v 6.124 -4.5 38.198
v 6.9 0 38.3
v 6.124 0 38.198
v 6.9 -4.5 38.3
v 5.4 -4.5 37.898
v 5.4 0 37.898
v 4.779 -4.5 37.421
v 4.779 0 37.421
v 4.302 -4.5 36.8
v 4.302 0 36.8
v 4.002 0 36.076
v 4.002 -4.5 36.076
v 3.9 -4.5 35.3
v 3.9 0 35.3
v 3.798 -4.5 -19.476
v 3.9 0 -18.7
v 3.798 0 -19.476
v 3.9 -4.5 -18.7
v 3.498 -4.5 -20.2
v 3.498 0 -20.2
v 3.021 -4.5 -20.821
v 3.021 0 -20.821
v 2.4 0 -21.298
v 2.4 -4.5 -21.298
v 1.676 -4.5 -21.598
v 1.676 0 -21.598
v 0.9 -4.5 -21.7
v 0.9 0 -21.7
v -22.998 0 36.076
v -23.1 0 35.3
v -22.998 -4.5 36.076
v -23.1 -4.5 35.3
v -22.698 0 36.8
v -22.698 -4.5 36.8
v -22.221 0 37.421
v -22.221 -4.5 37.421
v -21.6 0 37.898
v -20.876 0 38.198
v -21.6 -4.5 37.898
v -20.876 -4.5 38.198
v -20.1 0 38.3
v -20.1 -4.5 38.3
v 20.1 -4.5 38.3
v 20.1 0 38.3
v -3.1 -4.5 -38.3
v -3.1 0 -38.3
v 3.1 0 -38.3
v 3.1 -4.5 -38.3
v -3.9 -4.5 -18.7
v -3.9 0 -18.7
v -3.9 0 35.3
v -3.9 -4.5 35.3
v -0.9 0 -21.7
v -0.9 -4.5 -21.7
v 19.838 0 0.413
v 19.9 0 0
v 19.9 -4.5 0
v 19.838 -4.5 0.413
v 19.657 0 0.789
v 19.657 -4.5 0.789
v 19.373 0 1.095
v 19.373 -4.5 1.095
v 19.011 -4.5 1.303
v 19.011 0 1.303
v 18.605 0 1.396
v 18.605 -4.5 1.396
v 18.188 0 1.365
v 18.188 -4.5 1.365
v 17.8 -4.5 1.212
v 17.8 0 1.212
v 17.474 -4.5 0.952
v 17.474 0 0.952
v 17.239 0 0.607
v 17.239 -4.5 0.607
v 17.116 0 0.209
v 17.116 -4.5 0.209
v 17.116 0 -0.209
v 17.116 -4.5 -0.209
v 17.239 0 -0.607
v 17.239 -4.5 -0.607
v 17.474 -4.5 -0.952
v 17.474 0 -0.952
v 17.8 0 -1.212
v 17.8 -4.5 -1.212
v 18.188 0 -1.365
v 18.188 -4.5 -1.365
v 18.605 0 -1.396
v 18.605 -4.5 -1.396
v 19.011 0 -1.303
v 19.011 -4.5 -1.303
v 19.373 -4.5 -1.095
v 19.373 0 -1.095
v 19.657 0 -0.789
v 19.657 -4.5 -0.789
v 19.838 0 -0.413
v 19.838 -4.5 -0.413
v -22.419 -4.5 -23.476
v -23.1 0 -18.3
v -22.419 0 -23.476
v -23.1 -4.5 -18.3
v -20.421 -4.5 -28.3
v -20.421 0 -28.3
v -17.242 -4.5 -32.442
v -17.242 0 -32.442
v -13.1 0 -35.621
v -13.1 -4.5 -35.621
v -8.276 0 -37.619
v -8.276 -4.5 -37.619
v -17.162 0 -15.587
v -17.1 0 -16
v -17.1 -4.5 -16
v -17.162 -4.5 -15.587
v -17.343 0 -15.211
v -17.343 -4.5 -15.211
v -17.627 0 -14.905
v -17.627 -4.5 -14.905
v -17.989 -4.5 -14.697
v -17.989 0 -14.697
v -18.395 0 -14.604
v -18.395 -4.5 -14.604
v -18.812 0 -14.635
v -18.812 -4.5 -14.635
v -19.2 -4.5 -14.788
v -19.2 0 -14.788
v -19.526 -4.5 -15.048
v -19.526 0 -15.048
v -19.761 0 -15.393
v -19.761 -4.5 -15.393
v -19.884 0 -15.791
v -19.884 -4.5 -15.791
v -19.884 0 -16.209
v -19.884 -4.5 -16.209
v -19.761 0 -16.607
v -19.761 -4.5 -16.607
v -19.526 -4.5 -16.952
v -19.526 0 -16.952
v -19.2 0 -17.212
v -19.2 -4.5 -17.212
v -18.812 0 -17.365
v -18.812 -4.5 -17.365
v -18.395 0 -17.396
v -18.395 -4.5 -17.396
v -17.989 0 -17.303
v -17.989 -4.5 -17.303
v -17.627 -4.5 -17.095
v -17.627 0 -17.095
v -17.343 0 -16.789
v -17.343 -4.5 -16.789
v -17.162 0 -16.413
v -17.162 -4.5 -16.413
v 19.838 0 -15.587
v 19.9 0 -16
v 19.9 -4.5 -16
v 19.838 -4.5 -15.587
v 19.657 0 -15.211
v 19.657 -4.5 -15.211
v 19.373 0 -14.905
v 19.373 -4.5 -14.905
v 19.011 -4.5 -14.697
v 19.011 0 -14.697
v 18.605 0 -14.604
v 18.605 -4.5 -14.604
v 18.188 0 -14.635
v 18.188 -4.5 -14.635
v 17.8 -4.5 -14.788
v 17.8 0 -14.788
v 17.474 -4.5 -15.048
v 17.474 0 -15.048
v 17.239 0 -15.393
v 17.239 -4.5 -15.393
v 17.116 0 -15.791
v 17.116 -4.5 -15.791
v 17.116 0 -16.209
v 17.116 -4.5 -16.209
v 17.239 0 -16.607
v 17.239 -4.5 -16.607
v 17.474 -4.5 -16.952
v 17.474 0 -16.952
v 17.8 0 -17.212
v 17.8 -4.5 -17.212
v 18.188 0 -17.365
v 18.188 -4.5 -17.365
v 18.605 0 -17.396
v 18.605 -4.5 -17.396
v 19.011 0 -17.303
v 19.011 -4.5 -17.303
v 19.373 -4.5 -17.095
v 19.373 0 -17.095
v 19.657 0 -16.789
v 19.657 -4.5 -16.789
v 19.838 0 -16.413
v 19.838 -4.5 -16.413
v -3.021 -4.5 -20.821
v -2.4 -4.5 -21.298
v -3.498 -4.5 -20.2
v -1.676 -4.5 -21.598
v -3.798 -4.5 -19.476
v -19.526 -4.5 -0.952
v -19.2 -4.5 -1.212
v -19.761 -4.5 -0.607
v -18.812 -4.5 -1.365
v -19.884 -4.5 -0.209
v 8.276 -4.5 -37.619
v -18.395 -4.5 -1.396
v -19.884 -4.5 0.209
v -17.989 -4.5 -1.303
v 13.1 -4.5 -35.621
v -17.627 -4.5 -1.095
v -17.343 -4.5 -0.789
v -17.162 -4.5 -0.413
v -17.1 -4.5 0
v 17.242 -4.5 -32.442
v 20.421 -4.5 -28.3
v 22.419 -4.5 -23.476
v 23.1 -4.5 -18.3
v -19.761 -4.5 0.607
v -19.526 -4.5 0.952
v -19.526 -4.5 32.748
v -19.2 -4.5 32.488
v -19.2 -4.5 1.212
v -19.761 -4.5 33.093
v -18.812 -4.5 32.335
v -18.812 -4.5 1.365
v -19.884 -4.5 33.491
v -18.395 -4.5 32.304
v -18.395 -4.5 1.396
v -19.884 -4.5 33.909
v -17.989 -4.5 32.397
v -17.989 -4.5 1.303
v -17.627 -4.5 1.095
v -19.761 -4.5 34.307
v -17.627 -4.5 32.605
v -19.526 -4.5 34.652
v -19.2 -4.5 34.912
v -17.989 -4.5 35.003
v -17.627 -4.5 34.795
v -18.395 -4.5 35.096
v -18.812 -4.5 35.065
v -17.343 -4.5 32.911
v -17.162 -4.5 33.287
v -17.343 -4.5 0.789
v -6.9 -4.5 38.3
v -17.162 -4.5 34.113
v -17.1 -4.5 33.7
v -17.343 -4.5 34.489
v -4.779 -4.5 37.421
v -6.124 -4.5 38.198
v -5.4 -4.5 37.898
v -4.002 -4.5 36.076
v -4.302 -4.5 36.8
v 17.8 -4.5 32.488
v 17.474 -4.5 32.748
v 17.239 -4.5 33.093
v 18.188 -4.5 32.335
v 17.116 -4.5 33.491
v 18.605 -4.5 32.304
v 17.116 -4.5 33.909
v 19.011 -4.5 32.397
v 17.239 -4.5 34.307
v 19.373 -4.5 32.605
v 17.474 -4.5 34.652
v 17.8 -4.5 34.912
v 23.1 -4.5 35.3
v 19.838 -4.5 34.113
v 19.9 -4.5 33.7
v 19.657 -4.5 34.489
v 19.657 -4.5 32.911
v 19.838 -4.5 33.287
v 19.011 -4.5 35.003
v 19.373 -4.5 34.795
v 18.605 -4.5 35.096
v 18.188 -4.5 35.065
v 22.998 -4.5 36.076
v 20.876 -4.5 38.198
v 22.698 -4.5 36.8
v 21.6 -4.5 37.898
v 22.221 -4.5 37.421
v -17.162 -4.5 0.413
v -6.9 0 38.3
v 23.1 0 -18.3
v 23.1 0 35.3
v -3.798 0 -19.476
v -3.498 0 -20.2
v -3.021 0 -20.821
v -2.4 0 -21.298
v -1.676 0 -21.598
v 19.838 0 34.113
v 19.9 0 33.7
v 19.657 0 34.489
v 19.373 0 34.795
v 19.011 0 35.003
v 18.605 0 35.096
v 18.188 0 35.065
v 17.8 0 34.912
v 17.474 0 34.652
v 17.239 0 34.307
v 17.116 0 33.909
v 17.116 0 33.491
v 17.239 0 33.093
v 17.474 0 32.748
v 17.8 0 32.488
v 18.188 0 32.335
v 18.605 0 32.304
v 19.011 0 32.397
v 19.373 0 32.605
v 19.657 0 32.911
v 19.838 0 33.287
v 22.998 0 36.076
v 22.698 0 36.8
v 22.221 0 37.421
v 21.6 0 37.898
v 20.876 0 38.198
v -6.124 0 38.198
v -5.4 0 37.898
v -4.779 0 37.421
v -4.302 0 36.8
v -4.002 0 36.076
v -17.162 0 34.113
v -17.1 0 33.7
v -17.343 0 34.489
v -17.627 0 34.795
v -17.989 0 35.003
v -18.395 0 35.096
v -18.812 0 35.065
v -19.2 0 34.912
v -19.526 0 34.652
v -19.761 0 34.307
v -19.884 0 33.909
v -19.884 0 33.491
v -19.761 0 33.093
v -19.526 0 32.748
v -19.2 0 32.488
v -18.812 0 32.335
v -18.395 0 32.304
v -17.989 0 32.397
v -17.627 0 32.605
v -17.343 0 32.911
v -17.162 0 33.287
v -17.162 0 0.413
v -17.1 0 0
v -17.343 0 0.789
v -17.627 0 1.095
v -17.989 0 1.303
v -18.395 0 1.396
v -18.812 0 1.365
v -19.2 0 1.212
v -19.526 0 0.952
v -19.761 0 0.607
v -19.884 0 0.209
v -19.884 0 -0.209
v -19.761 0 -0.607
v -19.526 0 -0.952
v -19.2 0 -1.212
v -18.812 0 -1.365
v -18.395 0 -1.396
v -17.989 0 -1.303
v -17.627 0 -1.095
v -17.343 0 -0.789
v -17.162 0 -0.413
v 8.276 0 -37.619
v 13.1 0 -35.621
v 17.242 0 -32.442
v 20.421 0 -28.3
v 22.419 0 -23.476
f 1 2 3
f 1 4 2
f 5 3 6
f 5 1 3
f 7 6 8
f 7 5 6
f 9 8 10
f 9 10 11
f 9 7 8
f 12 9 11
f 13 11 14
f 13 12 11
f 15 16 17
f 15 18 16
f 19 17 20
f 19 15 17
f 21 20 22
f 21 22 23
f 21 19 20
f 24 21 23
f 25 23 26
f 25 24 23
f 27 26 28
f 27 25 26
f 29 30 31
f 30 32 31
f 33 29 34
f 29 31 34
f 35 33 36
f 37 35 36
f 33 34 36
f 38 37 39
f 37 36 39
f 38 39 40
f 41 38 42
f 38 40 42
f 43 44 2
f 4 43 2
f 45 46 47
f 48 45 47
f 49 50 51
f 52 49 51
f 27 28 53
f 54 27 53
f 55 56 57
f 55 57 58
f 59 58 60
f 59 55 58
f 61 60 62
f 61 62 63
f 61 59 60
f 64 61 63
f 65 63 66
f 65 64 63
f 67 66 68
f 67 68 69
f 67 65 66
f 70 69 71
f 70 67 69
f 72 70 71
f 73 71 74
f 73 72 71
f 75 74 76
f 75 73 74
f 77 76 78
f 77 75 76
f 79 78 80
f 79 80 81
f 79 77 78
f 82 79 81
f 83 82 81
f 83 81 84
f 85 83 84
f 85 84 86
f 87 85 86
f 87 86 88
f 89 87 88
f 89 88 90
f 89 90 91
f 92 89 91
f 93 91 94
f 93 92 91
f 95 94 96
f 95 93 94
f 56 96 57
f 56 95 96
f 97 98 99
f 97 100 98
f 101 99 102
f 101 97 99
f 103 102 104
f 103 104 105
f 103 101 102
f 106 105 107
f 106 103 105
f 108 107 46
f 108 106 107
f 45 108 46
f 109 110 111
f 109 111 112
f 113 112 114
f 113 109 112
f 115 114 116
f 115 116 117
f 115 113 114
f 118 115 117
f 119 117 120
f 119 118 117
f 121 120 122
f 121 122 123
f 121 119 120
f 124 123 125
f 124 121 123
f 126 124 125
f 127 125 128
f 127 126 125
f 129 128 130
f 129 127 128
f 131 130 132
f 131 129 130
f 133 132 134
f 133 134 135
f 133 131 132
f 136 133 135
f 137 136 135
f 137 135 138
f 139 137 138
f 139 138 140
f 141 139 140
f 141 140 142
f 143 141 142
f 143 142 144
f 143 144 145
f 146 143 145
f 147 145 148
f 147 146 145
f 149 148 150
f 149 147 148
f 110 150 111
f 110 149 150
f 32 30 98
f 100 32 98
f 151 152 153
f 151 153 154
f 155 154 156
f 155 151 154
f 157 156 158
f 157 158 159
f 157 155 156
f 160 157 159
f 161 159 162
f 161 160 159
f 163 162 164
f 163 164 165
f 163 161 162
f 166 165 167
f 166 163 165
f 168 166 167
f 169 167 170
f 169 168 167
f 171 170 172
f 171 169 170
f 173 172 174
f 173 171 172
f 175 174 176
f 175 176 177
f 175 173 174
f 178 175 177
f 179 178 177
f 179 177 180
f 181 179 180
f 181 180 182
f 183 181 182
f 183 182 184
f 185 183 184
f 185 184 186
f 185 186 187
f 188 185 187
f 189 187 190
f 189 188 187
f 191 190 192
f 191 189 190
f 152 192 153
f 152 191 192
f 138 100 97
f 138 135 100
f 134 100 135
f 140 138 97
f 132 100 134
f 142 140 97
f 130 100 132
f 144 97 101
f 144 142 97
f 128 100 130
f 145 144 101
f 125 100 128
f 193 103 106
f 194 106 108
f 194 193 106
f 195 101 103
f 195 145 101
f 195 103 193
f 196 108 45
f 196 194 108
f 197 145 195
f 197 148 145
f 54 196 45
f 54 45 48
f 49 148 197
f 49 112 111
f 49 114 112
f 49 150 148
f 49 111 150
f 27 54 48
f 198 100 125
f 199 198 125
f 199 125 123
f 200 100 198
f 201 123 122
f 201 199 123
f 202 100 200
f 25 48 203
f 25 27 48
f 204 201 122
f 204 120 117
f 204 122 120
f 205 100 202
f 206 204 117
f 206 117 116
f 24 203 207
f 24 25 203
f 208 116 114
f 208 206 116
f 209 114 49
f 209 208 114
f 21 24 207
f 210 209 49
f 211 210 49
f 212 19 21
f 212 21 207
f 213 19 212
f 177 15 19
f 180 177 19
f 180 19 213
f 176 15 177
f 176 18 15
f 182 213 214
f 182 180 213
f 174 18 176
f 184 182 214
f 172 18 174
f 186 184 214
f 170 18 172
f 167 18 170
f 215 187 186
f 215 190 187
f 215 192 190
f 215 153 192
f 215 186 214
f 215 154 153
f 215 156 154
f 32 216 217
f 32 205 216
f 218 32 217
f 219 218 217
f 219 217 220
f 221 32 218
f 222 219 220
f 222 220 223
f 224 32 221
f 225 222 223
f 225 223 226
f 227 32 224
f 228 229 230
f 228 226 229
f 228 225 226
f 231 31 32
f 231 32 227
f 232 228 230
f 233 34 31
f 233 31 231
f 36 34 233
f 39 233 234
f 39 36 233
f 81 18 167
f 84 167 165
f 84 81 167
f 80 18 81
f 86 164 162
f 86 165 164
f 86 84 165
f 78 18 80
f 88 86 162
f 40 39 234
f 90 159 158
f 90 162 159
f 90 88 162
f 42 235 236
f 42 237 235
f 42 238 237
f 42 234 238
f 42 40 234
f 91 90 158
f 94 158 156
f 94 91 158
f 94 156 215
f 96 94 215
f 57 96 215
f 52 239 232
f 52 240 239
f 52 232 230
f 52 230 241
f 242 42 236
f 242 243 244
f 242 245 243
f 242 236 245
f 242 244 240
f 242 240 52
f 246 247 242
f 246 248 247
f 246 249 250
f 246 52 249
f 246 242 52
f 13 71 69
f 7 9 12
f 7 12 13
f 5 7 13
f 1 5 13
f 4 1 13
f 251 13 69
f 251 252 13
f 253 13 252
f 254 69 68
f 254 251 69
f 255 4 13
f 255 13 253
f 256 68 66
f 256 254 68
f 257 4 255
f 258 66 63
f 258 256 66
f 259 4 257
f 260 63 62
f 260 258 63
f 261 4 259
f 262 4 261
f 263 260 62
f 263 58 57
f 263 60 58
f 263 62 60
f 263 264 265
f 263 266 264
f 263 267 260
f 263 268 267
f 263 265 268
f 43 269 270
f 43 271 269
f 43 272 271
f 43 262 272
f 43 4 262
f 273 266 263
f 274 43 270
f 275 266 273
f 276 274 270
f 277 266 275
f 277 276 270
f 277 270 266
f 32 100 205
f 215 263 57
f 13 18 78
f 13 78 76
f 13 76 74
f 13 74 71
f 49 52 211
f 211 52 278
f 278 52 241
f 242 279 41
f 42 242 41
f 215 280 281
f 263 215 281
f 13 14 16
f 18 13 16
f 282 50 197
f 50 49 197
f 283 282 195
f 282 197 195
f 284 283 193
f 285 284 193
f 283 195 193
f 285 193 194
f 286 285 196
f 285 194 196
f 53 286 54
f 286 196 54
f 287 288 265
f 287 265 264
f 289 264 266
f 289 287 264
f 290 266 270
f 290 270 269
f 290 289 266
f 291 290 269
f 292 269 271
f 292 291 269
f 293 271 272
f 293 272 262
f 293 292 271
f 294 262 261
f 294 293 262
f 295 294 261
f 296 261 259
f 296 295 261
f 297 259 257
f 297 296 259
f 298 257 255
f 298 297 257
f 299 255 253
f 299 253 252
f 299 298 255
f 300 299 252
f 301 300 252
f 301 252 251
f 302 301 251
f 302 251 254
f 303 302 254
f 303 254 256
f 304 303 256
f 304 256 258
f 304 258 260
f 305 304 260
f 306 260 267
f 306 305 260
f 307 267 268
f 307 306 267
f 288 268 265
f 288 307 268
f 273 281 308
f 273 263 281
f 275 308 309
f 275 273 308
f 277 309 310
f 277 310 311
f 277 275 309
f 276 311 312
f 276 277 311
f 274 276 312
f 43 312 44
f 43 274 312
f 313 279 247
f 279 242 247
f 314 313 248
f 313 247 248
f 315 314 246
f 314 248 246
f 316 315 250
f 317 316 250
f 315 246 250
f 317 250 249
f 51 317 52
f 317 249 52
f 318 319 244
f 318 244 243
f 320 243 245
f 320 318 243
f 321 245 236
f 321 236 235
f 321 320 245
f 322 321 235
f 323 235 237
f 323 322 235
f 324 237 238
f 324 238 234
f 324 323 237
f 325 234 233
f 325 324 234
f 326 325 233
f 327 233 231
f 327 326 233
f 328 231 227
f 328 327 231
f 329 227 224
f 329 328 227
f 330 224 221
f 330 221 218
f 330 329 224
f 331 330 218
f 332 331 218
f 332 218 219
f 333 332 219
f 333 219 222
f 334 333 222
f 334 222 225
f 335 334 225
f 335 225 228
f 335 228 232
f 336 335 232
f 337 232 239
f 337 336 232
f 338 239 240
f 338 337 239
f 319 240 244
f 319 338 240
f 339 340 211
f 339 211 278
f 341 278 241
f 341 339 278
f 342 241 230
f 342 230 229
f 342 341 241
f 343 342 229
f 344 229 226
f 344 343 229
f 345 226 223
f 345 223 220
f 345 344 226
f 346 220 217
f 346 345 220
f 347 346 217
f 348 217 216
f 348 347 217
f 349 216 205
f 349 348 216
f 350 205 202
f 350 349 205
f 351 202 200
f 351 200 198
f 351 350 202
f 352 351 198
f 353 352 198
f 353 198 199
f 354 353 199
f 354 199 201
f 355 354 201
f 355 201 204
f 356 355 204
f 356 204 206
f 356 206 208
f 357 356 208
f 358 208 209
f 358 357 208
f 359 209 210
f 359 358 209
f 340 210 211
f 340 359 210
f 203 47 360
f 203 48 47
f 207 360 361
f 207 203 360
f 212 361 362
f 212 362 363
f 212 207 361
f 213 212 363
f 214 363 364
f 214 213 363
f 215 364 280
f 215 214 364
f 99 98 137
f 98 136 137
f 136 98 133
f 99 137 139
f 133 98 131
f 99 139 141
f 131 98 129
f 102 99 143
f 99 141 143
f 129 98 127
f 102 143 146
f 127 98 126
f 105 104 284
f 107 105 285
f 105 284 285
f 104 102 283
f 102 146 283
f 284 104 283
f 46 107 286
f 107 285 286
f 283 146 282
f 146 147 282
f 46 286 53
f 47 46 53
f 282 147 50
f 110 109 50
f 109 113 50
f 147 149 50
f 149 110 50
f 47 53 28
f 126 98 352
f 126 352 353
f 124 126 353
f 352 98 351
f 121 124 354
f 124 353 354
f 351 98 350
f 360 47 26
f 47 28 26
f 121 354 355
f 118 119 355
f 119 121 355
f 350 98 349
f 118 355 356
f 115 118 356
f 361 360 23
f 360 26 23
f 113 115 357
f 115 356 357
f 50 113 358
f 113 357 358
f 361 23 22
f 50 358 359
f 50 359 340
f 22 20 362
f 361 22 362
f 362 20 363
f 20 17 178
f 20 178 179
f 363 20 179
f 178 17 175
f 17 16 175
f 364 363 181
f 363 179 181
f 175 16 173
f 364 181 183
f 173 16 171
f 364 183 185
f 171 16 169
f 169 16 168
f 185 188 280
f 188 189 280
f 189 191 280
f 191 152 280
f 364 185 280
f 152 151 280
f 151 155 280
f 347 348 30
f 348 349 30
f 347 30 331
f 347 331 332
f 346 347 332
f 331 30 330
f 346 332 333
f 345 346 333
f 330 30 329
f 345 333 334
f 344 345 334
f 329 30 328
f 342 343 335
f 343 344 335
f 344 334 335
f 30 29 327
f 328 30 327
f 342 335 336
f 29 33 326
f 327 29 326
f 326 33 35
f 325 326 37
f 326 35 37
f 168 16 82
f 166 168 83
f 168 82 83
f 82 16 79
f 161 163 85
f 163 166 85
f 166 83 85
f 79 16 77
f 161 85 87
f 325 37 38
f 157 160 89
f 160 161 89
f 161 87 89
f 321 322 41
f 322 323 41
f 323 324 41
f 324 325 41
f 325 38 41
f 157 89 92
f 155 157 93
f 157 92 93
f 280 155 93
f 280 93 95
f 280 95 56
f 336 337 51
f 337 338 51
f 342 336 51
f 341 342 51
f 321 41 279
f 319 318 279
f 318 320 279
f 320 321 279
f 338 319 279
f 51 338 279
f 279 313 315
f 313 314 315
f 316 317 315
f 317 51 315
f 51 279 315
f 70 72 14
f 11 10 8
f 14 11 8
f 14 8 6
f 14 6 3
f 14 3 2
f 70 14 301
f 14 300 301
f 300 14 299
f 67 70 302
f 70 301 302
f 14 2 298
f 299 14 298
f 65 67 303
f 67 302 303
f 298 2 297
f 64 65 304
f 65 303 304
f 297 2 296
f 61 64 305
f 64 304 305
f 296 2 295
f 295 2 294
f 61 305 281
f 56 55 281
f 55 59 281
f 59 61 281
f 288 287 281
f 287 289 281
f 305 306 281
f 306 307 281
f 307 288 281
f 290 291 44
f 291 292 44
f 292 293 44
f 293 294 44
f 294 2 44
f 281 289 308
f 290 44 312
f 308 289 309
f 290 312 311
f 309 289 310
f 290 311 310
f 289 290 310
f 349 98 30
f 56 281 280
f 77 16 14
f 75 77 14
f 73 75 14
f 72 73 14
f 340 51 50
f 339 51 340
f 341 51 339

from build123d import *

# Parameters (mm, degrees)
F0_R     = 1.4
F1_DEPTH = 4.5
F2_R     = 3
F3_R     = 20


with BuildPart() as f1:
    # F0 (on Front) → F1 (new body)
    with BuildSketch(Plane.XZ):
        Polygon((-23.1, -38.3), (23.1, -38.3), (23.1, 38.3), (3.9, 38.3), (3.9, -21.7), (-3.9, -21.7), (-3.9, 38.3), (-23.1, 38.3), align=None)
        with Locations((-18.5, -16)):
            Circle(F0_R, mode=Mode.SUBTRACT)
        with Locations((18.5, -16)):
            Circle(F0_R, mode=Mode.SUBTRACT)
        with Locations((-18.5, 0)):
            Circle(F0_R, mode=Mode.SUBTRACT)
        with Locations((-18.5, 33.7)):
            Circle(F0_R, mode=Mode.SUBTRACT)
        with Locations((18.5, 0)):
            Circle(F0_R, mode=Mode.SUBTRACT)
        with Locations((18.5, 33.7)):
            Circle(F0_R, mode=Mode.SUBTRACT)
    extrude(amount=F1_DEPTH)

    # F2
    f2_edges = [f1.edges().sort_by_distance(p)[0] for p in [
        (-23.1, -2.25, 38.3),
        (23.1, -2.25, 38.3),
        (-3.9, -2.25, -21.7),
        (3.9, -2.25, -21.7),
        (-3.9, -2.25, 38.3),
        (3.9, -2.25, 38.3),
    ]]
    fillet(f2_edges, radius=F2_R)

    # F3
    f3_edges = [f1.edges().sort_by_distance(p)[0] for p in [
        (-23.1, -2.25, -38.3),
        (23.1, -2.25, -38.3),
    ]]
    fillet(f3_edges, radius=F3_R)


solid = f1.part
